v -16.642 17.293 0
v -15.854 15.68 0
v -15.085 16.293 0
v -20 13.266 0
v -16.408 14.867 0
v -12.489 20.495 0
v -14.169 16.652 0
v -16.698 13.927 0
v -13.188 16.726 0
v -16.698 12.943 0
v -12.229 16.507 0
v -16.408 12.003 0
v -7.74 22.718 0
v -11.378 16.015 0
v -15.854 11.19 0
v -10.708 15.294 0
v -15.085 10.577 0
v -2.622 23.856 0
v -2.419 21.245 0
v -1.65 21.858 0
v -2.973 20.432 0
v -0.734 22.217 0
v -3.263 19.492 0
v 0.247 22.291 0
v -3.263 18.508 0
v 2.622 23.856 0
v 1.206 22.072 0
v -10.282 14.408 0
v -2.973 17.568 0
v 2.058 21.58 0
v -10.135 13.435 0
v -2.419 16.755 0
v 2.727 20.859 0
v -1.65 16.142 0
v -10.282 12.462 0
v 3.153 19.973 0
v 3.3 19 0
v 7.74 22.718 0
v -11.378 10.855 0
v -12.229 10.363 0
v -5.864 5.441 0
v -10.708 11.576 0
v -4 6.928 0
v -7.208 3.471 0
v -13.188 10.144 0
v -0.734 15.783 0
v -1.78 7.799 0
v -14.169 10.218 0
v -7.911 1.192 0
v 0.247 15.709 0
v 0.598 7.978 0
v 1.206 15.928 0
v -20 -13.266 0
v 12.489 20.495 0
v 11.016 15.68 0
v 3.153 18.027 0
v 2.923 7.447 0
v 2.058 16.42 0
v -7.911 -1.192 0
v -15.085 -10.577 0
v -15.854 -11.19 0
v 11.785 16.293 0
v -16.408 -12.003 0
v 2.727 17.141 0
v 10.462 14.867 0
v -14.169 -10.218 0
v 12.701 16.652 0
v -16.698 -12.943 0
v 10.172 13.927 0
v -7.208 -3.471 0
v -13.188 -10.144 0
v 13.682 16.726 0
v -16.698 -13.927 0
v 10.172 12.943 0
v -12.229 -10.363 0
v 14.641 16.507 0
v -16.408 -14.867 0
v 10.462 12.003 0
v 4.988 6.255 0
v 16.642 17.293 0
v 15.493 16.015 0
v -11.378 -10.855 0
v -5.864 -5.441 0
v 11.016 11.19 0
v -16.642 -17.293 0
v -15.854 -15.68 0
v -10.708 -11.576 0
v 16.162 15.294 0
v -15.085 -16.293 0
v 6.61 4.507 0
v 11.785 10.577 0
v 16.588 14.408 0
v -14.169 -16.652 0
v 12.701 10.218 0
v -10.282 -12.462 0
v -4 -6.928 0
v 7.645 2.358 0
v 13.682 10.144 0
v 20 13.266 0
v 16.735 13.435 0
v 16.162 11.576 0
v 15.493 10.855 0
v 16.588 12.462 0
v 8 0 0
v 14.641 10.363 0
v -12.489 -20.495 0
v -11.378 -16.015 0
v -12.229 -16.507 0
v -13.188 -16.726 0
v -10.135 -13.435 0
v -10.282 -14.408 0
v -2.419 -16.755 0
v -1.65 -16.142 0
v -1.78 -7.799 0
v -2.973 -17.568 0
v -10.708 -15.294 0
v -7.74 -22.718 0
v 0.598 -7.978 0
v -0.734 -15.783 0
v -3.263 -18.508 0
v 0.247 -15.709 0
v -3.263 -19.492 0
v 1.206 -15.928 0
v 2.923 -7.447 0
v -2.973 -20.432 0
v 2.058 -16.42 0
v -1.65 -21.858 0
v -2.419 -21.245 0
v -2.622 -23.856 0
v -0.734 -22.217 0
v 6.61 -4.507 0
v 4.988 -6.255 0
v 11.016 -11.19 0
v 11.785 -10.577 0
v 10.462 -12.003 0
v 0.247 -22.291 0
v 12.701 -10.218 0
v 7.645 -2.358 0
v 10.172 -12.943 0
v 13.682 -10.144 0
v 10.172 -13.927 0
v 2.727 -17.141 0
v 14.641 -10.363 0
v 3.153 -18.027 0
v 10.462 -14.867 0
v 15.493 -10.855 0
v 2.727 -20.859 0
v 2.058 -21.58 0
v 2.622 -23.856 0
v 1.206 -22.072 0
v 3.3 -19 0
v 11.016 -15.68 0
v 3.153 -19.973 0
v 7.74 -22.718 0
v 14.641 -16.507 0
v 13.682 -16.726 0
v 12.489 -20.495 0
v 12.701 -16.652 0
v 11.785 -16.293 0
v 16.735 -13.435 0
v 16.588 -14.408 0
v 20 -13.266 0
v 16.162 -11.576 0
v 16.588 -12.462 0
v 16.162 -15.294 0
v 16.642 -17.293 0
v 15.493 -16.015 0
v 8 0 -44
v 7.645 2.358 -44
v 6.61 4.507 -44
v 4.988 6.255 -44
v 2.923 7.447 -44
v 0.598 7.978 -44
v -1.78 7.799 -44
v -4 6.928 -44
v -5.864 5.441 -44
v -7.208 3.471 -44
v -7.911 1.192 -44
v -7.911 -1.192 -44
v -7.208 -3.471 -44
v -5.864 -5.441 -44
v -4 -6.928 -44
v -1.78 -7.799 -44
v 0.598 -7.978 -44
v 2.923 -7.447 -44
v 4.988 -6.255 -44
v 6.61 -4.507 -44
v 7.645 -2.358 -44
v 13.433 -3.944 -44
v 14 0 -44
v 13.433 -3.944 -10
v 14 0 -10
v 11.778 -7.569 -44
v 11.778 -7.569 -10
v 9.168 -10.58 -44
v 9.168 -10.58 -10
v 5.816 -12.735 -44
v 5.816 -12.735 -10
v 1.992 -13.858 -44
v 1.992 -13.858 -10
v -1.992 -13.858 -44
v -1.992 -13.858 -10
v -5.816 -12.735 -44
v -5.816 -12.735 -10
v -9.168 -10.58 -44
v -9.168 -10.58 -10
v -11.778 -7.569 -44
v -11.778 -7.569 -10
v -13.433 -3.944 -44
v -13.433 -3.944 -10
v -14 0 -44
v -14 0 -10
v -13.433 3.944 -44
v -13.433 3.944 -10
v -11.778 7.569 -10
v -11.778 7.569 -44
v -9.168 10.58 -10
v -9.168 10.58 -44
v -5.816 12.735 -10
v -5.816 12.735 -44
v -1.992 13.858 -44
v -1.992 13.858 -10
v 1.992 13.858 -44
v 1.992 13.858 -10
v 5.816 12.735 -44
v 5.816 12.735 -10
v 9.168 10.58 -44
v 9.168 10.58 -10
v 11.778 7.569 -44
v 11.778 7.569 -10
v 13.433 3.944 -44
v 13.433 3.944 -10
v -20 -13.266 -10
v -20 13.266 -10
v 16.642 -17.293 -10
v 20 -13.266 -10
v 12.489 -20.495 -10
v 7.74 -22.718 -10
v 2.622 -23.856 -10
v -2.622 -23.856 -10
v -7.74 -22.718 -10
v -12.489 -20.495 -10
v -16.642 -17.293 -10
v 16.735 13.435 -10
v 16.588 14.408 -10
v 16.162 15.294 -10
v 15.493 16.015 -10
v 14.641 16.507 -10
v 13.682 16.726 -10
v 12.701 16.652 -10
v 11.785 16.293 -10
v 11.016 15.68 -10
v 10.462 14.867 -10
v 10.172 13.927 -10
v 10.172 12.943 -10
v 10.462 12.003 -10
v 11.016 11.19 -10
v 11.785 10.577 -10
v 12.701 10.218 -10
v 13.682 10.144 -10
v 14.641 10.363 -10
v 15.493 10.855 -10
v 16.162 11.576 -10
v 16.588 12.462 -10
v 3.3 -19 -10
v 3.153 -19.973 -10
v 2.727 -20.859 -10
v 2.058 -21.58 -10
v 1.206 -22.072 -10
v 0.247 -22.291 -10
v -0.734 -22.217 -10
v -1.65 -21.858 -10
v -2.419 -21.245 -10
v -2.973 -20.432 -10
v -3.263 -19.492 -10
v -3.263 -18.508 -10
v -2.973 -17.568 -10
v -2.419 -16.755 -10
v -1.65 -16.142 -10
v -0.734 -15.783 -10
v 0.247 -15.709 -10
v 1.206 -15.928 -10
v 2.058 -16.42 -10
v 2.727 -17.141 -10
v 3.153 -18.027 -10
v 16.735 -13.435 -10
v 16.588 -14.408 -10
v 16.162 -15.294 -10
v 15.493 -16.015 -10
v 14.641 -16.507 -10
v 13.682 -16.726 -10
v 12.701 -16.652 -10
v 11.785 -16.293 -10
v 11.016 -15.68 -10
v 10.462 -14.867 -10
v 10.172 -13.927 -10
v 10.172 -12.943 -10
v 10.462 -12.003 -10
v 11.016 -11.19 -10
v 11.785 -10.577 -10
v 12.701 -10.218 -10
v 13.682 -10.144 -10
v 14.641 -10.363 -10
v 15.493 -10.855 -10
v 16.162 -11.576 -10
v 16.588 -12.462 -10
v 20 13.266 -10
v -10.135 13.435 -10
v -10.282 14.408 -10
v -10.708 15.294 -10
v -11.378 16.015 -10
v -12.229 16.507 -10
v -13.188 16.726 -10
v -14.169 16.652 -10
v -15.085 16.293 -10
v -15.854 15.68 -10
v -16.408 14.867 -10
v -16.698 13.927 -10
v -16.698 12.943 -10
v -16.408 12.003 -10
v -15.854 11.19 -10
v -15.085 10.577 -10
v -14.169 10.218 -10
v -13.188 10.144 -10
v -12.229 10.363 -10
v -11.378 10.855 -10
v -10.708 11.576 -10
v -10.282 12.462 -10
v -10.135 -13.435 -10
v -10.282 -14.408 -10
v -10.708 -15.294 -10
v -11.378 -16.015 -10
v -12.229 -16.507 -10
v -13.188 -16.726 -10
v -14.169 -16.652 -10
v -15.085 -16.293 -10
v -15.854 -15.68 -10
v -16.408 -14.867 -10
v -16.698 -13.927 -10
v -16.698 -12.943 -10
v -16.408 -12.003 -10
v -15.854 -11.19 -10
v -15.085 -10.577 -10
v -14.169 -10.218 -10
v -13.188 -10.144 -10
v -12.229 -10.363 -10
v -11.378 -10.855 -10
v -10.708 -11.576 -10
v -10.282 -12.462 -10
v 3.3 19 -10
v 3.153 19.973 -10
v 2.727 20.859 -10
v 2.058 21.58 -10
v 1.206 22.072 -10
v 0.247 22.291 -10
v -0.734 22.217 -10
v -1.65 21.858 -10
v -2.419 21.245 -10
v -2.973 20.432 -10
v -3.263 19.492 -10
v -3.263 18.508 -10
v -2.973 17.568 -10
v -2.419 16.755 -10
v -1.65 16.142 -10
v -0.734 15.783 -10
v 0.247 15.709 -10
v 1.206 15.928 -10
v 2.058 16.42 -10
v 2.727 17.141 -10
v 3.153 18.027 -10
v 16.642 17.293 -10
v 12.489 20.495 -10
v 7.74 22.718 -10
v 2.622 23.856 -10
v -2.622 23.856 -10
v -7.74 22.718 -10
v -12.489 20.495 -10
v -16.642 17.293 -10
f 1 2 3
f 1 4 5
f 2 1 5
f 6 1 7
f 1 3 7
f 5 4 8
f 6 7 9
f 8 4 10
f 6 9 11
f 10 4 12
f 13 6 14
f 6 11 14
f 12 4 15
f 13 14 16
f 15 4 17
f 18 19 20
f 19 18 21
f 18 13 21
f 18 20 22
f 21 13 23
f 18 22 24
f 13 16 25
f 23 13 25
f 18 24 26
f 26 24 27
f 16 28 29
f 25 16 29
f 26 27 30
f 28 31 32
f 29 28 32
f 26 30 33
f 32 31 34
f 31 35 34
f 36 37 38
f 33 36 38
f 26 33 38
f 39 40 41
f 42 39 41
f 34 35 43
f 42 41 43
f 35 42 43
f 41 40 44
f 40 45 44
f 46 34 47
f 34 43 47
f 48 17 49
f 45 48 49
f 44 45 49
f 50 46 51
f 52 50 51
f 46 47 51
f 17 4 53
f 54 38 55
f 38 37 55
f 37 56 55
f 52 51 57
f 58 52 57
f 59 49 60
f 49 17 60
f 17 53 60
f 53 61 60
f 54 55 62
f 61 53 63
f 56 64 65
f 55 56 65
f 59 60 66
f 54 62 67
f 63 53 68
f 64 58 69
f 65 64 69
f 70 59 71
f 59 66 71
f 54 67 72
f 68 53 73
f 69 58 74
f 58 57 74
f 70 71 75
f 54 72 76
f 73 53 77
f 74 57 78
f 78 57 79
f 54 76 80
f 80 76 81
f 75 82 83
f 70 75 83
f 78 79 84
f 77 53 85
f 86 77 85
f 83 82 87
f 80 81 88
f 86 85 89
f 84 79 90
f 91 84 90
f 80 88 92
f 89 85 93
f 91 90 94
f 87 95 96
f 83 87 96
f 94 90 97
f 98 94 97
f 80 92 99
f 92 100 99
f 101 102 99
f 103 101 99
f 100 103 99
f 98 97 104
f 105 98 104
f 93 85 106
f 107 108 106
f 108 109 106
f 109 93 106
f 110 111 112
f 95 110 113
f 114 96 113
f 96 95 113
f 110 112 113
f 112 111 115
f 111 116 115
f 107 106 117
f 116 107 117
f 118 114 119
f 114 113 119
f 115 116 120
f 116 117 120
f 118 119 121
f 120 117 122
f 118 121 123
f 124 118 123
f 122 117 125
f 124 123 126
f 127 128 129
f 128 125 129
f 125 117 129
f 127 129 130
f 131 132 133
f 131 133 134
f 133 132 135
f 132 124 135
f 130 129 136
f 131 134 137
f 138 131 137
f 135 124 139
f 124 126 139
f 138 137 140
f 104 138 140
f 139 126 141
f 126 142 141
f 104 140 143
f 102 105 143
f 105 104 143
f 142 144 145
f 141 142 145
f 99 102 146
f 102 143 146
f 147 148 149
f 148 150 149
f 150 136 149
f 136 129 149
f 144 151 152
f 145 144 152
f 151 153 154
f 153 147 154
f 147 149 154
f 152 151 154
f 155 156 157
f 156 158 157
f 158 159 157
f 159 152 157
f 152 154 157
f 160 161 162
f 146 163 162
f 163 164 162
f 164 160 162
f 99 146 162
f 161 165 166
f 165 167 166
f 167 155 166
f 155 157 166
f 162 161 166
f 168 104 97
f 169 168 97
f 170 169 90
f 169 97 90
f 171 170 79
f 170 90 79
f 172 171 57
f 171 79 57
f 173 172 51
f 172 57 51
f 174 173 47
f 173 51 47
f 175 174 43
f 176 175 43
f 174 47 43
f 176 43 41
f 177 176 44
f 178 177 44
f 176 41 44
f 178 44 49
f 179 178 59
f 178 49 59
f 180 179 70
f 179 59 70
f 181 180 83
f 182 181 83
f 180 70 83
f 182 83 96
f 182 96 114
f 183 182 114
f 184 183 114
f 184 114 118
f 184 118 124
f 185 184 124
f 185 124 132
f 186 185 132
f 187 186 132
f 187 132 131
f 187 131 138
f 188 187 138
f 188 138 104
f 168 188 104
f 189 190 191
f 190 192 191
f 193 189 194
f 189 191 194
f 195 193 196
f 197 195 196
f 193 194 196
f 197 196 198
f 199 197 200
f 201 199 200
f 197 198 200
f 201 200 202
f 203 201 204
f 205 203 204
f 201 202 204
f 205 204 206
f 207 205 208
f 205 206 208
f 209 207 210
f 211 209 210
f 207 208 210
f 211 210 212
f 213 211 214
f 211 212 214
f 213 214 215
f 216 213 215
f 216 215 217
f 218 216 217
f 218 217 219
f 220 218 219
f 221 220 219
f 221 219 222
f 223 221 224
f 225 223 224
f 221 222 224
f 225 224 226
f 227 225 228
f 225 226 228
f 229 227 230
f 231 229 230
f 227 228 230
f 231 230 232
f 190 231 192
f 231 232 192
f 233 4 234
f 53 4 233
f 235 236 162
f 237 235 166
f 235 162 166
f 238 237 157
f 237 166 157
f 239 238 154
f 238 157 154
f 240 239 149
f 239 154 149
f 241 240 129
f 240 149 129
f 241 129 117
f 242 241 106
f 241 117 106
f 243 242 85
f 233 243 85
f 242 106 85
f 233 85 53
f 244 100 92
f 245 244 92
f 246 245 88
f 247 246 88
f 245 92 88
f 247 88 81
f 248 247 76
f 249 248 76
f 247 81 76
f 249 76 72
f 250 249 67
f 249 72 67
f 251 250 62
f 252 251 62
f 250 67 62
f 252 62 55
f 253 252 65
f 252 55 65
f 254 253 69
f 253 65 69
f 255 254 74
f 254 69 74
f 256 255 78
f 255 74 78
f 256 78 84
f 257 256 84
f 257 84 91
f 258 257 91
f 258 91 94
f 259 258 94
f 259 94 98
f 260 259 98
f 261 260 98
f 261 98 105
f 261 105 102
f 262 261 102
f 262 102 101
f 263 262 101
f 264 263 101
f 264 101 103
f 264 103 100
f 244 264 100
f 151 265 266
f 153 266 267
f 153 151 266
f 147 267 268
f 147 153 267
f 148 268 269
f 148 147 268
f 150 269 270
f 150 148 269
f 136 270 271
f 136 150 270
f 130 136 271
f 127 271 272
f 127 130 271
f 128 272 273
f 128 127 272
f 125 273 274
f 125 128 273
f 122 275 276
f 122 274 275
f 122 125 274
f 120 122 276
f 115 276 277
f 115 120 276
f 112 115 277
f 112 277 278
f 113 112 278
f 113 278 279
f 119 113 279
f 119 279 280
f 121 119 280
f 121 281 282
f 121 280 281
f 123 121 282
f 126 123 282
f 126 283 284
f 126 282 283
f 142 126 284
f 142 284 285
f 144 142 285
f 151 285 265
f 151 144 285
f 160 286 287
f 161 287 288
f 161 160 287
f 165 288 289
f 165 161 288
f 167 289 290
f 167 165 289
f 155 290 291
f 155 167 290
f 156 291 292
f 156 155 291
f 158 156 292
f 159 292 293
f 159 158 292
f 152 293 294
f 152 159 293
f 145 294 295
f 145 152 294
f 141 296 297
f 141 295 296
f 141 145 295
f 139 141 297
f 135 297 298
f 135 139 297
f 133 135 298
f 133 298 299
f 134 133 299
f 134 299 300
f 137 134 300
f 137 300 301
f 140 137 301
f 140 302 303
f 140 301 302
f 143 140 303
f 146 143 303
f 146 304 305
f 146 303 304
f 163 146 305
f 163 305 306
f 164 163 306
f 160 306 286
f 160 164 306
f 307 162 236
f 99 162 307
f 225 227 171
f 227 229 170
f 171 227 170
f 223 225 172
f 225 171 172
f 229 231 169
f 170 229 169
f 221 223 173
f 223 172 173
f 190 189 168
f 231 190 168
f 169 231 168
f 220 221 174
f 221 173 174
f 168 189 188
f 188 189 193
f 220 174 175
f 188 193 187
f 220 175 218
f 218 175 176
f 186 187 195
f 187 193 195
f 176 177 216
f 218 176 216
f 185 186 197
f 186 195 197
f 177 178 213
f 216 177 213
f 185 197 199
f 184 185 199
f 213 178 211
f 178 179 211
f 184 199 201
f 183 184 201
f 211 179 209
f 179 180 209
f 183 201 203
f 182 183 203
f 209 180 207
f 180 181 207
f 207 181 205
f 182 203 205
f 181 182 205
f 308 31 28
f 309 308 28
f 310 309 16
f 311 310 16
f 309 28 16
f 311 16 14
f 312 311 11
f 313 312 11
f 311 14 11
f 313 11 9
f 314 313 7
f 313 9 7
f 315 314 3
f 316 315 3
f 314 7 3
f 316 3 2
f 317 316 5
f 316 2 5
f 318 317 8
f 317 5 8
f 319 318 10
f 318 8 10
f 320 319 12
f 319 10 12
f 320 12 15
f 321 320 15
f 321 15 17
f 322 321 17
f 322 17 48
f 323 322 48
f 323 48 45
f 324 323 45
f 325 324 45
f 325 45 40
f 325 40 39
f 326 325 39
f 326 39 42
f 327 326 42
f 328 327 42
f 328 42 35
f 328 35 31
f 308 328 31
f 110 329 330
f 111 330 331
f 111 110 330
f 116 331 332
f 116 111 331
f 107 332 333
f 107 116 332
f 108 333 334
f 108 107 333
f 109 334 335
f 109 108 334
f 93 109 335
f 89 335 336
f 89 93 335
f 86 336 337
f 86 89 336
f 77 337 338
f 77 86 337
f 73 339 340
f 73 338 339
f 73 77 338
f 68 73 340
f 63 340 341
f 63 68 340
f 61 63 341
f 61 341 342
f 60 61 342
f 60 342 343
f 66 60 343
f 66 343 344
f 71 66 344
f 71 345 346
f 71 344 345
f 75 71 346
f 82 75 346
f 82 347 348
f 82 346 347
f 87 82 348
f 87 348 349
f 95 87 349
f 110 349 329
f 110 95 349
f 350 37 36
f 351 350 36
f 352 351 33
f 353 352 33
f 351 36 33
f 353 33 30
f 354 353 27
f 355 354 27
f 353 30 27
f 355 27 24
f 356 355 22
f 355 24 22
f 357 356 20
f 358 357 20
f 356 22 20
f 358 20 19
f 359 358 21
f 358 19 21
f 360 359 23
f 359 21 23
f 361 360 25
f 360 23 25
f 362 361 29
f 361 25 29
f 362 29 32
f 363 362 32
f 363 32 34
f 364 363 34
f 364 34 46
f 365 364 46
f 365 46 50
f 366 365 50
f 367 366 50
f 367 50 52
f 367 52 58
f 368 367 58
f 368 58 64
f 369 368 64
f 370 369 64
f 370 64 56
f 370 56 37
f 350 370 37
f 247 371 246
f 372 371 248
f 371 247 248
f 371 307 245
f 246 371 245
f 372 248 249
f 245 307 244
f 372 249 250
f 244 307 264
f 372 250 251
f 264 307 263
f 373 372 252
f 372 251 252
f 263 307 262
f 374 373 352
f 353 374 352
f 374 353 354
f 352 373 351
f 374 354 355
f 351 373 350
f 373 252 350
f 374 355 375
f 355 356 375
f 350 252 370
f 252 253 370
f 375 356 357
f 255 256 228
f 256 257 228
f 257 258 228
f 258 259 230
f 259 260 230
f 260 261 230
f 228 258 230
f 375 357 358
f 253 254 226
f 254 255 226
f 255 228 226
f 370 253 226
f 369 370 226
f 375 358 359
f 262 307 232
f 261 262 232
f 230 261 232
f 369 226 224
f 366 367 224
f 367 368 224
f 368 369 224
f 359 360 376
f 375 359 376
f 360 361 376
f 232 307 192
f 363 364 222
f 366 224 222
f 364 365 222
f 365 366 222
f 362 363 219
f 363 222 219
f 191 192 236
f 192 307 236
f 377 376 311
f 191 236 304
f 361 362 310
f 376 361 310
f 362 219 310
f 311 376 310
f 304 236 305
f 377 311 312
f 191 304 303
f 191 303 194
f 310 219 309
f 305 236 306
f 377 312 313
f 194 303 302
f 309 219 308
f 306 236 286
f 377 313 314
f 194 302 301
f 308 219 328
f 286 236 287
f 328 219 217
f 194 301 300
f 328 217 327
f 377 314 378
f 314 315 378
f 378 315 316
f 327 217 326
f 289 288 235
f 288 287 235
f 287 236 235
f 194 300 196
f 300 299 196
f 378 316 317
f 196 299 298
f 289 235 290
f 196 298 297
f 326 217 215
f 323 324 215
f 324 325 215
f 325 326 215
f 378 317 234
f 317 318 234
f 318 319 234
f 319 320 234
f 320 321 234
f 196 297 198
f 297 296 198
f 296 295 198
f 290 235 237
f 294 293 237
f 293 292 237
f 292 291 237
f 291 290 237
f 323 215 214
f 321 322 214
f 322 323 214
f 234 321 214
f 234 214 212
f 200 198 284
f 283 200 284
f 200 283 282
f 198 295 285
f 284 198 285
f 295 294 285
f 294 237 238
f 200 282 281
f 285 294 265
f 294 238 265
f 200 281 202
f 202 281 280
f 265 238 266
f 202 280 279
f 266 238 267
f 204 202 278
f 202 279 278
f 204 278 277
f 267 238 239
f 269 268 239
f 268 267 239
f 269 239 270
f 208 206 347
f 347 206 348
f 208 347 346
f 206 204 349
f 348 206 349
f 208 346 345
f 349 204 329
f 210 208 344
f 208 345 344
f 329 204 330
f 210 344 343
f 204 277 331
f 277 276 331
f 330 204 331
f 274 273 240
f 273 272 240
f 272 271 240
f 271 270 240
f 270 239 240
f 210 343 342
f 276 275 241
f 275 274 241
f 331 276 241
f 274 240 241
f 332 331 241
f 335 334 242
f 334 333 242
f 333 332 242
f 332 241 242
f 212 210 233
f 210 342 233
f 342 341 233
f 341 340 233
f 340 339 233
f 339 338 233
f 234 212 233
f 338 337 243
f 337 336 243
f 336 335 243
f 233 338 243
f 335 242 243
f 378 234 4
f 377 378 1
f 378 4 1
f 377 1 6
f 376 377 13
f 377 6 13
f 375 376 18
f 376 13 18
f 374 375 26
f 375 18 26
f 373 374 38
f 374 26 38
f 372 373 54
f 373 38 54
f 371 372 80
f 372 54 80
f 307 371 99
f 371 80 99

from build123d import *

# Parameters (mm, degrees)
SZKIC2_R                   = 3.3
SZKIC2_R_2                 = 8
WYTNIJ_WYCI_GNI_CIE1_DEPTH = 56.569775958


with BuildPart() as part:
    # Szkic1 → Obrót1 (revolve)
    with BuildSketch(Plane(origin=(0, 0, 0), x_dir=(0, 0, -1), z_dir=(1, 0, 0)), mode=Mode.PRIVATE) as obr_t1_sk:
        Polygon((0, 0), (44, 0), (44, 14), (10, 14), (10, 24), (0, 24), align=None)
    revolve(obr_t1_sk.sketch.rotate(Axis((0, 0, 0), (0, 0, -1)), 90), axis=Axis((0, 0, 0), (0, 0, -1)))

    # Szkic2 → Wytnij-wyciągnięcie1 (cut, through all)
    with BuildSketch(Plane.XY):
        with Locations((-13.435028843, 13.435028843)):
            Circle(SZKIC2_R)
        with Locations((0, 19)):
            Circle(SZKIC2_R)
        with Locations((13.435028843, 13.435028843)):
            Circle(SZKIC2_R)
        Circle(SZKIC2_R_2)
        with BuildLine():
            Line((-20, 13.266499161), (-20, -13.266499161))
            ThreePointArc((-20, -13.266499161), (-24, 0), (-20, 13.266499161))
        make_face()
        with BuildLine():
            Line((20, -13.266499161), (20, 13.266499161))
            ThreePointArc((20, 13.266499161), (24, 0), (20, -13.266499161))
        make_face()
    wytnij_wyci_gni_cie1 = extrude(amount=-WYTNIJ_WYCI_GNI_CIE1_DEPTH, mode=Mode.SUBTRACT)

    # Lustro1: Wytnij-wyciągnięcie1 across plane
    add(wytnij_wyci_gni_cie1.mirror(Plane.ZX), mode=Mode.SUBTRACT)


solid = part.part
